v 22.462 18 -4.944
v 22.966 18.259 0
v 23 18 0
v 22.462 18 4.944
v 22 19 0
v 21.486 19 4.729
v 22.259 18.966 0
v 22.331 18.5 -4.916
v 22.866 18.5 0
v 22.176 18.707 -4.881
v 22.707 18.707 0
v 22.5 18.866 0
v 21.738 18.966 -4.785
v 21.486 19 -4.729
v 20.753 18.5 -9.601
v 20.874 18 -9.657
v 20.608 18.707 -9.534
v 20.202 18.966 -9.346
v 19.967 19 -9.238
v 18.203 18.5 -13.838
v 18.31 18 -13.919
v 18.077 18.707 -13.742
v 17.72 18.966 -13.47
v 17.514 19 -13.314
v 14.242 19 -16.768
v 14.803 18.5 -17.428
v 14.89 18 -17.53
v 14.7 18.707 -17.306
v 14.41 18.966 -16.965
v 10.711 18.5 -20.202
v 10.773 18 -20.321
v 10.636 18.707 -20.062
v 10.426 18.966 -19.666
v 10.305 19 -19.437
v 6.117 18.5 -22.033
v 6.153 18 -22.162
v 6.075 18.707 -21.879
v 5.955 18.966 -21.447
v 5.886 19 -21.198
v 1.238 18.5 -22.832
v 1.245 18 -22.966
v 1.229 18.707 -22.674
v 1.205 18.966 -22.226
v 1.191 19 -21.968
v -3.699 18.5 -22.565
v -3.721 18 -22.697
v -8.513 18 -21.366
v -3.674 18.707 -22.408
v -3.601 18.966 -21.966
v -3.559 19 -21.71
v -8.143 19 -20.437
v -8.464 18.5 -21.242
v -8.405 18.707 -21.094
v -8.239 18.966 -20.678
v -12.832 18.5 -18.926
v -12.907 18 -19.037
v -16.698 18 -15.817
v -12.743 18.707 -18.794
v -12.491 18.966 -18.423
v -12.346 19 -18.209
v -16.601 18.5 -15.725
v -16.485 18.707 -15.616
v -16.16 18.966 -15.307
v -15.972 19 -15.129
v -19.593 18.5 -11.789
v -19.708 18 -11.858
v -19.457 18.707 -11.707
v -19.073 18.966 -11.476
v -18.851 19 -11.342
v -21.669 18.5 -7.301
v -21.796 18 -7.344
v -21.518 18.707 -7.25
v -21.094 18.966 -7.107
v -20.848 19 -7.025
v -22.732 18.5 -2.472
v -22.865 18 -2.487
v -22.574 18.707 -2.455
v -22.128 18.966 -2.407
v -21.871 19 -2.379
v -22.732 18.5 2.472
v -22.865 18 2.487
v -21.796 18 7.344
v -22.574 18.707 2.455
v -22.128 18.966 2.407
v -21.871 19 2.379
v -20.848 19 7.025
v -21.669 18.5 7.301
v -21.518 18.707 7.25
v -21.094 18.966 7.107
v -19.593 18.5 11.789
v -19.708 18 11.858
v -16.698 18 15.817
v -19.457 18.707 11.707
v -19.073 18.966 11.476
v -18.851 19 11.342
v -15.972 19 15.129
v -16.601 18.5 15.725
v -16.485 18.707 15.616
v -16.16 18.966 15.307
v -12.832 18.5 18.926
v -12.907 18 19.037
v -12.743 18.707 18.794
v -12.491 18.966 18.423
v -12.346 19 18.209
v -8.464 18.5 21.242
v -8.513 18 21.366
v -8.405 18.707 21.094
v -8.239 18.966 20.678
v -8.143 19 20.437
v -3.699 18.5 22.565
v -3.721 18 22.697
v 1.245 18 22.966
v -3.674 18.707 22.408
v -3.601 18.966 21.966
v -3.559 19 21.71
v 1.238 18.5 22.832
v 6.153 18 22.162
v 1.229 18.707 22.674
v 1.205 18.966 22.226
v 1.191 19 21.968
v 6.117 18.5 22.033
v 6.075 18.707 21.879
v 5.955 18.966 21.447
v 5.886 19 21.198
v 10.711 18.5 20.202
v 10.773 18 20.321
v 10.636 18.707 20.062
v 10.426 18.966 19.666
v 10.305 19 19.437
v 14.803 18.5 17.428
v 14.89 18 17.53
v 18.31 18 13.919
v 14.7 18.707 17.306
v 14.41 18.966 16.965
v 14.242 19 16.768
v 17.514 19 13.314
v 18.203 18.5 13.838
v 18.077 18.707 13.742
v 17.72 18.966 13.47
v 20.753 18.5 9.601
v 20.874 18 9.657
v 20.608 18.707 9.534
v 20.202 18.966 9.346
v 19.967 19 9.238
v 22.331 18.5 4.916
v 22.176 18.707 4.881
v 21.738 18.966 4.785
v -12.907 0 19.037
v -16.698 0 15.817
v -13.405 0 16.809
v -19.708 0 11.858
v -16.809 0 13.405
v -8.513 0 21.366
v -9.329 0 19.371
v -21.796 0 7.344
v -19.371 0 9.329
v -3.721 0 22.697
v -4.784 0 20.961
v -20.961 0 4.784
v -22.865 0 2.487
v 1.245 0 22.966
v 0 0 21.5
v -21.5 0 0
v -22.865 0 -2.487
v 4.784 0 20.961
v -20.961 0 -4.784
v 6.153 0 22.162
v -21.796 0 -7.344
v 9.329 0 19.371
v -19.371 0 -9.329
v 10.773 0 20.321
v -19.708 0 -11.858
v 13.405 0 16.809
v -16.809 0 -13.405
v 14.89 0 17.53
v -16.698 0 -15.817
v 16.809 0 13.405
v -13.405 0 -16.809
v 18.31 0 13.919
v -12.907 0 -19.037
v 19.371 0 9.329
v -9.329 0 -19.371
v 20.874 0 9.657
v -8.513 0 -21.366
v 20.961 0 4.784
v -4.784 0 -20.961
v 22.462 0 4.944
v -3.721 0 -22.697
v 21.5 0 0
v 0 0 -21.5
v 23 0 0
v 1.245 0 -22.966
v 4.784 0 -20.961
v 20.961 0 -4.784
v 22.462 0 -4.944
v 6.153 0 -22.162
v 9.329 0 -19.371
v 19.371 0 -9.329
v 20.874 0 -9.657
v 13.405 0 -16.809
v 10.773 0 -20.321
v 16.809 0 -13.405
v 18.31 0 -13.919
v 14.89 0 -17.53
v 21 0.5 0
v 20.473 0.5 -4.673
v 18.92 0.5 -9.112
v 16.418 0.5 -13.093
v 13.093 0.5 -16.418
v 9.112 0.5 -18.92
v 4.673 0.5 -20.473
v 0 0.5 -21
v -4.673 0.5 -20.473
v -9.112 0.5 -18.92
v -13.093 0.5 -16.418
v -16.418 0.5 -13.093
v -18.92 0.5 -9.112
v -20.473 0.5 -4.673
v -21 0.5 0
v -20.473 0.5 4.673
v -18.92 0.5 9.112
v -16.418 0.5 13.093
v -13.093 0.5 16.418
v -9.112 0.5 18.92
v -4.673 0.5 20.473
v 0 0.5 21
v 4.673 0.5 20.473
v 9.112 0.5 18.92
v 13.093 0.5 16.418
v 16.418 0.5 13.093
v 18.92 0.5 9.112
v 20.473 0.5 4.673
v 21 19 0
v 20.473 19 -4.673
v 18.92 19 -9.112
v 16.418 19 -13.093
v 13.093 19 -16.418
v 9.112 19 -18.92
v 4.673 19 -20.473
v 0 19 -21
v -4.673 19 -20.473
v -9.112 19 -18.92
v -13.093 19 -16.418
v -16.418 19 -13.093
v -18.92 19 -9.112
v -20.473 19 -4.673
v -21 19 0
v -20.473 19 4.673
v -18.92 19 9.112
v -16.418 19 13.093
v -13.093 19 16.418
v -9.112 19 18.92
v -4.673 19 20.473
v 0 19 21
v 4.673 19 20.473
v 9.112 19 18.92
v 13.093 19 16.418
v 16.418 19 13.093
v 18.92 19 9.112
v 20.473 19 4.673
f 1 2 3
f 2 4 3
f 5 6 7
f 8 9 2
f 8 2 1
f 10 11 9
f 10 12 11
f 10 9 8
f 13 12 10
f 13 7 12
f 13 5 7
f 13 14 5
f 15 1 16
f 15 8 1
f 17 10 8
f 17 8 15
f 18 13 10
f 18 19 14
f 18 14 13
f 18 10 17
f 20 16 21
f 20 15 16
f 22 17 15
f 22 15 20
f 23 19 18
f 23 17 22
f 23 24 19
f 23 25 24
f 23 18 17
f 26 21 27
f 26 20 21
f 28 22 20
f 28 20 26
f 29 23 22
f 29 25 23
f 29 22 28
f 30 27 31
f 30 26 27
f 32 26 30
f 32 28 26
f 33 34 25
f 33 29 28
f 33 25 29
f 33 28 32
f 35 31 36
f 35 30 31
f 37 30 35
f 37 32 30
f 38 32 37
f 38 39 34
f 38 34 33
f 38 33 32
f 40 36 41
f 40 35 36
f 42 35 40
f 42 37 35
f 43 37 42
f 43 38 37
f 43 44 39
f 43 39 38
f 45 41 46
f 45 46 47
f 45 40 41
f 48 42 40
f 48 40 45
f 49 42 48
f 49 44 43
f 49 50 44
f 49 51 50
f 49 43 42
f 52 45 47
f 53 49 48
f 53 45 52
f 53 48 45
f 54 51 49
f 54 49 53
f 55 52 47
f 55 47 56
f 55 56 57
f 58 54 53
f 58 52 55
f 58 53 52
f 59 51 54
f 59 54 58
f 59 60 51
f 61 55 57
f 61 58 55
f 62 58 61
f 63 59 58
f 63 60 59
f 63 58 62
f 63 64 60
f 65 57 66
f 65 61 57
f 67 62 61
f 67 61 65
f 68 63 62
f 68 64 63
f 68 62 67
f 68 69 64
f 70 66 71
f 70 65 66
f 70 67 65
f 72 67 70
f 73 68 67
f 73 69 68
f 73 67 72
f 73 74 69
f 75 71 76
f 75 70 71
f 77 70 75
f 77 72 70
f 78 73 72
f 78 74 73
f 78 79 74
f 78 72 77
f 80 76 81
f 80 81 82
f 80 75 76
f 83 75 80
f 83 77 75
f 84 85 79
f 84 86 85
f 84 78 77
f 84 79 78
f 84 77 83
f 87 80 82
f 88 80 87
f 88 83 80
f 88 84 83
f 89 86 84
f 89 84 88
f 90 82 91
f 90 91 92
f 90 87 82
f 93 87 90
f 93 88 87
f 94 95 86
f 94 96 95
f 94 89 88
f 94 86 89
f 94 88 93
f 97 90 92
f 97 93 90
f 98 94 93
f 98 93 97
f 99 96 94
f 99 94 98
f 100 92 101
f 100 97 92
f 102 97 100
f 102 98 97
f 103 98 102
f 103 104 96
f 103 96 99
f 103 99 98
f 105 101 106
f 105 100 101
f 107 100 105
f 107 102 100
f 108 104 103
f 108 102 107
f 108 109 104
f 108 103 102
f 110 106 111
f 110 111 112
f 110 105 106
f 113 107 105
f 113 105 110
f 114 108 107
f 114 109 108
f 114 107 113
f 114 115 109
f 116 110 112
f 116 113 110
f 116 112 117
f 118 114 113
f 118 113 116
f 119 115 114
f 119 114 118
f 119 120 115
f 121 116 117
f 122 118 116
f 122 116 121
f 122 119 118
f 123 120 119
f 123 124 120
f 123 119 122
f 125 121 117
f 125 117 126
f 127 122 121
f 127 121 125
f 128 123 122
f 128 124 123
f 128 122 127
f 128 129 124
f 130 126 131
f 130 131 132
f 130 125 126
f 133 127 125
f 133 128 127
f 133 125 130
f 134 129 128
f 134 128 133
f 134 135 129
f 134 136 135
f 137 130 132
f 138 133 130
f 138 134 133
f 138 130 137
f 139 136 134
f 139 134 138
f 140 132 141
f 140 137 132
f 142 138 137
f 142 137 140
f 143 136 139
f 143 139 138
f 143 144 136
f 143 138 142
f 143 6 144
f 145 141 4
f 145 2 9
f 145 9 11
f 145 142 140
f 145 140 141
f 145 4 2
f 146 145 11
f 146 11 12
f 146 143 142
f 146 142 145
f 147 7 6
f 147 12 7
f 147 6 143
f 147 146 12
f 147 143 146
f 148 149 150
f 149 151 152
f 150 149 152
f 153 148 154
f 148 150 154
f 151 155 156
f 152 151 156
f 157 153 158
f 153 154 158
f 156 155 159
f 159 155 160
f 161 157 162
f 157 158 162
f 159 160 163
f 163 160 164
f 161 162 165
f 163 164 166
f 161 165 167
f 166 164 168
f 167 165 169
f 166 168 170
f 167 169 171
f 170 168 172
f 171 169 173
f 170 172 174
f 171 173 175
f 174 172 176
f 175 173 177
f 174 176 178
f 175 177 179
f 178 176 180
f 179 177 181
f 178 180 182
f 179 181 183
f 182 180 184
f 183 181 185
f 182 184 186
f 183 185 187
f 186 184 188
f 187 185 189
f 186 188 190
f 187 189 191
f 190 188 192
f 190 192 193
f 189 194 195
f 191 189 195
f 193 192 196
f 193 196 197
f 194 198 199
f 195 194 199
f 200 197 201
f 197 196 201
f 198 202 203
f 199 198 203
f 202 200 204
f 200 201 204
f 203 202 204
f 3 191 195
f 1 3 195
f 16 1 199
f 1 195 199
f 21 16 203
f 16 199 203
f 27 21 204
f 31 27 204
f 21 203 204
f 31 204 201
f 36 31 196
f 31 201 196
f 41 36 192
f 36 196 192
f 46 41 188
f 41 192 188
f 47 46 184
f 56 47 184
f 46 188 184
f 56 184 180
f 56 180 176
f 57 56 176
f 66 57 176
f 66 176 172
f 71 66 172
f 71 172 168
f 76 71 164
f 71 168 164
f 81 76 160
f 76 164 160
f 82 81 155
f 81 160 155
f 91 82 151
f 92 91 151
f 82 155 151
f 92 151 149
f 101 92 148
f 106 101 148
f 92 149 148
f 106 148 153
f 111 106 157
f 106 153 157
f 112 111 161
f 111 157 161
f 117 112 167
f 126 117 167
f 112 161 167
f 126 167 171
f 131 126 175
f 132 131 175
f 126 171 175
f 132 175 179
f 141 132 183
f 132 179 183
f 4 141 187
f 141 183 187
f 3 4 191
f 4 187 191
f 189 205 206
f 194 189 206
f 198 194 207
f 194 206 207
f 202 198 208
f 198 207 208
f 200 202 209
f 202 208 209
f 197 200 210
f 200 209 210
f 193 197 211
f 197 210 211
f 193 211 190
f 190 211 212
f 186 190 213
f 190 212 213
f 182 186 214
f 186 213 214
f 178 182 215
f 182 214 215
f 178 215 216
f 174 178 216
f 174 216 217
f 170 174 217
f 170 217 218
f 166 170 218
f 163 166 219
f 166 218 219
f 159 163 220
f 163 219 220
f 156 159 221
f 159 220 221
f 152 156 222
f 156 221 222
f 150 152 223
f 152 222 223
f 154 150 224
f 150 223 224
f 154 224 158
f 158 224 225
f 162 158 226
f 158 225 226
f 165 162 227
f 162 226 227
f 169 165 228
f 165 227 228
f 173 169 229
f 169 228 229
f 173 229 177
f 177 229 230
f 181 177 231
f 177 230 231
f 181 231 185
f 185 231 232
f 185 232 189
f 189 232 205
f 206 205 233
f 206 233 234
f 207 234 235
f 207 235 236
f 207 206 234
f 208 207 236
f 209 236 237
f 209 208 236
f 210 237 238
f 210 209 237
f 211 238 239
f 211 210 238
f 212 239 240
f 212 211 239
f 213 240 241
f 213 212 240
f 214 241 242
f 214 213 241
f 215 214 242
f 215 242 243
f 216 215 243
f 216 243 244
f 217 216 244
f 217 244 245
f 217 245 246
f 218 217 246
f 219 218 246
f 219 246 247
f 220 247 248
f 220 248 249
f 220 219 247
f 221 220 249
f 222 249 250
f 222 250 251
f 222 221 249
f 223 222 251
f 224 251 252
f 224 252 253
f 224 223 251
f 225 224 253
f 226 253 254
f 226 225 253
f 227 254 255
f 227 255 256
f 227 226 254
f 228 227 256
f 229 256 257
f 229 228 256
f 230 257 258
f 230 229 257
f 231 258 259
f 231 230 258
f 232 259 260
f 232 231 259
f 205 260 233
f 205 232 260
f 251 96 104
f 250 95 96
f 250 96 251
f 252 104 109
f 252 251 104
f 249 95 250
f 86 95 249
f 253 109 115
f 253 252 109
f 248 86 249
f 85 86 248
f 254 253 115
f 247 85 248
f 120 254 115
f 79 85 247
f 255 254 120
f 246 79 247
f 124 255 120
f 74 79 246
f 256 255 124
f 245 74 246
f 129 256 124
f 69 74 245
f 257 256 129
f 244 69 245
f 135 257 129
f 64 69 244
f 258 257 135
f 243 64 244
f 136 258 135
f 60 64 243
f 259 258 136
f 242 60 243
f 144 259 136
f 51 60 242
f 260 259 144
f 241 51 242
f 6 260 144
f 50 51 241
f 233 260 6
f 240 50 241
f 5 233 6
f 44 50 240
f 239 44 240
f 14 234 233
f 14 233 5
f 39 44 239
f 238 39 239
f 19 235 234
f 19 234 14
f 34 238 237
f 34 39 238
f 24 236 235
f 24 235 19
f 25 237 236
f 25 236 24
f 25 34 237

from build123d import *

# Parameters (mm, degrees)
SKETCH1_R           = 23
SKETCH1_R_2         = 21
EXTRUDE_THIN1_DEPTH = 19
FILLET1_R           = 1
CHAMFER1_SIZE       = 0.5


with BuildPart() as part:
    # Sketch1 → Extrude-Thin1 (new body)
    with BuildSketch(Plane(origin=(0, 0, 0), x_dir=(1, 0, 0), z_dir=(0, 1, 0))):
        Circle(SKETCH1_R)
        Circle(SKETCH1_R_2, mode=Mode.SUBTRACT)
    extrude(amount=EXTRUDE_THIN1_DEPTH)

    # Fillet1
    fillet1_edges = [part.edges().sort_by_distance(p)[0] for p in [
        (-23, 19, 0),
    ]]
    fillet(fillet1_edges, radius=FILLET1_R)

    # Chamfer1
    chamfer1_edges = [part.edges().sort_by_distance(p)[0] for p in [
        (-21, 0, 0),
    ]]
    chamfer(chamfer1_edges, length=CHAMFER1_SIZE)


solid = part.part
